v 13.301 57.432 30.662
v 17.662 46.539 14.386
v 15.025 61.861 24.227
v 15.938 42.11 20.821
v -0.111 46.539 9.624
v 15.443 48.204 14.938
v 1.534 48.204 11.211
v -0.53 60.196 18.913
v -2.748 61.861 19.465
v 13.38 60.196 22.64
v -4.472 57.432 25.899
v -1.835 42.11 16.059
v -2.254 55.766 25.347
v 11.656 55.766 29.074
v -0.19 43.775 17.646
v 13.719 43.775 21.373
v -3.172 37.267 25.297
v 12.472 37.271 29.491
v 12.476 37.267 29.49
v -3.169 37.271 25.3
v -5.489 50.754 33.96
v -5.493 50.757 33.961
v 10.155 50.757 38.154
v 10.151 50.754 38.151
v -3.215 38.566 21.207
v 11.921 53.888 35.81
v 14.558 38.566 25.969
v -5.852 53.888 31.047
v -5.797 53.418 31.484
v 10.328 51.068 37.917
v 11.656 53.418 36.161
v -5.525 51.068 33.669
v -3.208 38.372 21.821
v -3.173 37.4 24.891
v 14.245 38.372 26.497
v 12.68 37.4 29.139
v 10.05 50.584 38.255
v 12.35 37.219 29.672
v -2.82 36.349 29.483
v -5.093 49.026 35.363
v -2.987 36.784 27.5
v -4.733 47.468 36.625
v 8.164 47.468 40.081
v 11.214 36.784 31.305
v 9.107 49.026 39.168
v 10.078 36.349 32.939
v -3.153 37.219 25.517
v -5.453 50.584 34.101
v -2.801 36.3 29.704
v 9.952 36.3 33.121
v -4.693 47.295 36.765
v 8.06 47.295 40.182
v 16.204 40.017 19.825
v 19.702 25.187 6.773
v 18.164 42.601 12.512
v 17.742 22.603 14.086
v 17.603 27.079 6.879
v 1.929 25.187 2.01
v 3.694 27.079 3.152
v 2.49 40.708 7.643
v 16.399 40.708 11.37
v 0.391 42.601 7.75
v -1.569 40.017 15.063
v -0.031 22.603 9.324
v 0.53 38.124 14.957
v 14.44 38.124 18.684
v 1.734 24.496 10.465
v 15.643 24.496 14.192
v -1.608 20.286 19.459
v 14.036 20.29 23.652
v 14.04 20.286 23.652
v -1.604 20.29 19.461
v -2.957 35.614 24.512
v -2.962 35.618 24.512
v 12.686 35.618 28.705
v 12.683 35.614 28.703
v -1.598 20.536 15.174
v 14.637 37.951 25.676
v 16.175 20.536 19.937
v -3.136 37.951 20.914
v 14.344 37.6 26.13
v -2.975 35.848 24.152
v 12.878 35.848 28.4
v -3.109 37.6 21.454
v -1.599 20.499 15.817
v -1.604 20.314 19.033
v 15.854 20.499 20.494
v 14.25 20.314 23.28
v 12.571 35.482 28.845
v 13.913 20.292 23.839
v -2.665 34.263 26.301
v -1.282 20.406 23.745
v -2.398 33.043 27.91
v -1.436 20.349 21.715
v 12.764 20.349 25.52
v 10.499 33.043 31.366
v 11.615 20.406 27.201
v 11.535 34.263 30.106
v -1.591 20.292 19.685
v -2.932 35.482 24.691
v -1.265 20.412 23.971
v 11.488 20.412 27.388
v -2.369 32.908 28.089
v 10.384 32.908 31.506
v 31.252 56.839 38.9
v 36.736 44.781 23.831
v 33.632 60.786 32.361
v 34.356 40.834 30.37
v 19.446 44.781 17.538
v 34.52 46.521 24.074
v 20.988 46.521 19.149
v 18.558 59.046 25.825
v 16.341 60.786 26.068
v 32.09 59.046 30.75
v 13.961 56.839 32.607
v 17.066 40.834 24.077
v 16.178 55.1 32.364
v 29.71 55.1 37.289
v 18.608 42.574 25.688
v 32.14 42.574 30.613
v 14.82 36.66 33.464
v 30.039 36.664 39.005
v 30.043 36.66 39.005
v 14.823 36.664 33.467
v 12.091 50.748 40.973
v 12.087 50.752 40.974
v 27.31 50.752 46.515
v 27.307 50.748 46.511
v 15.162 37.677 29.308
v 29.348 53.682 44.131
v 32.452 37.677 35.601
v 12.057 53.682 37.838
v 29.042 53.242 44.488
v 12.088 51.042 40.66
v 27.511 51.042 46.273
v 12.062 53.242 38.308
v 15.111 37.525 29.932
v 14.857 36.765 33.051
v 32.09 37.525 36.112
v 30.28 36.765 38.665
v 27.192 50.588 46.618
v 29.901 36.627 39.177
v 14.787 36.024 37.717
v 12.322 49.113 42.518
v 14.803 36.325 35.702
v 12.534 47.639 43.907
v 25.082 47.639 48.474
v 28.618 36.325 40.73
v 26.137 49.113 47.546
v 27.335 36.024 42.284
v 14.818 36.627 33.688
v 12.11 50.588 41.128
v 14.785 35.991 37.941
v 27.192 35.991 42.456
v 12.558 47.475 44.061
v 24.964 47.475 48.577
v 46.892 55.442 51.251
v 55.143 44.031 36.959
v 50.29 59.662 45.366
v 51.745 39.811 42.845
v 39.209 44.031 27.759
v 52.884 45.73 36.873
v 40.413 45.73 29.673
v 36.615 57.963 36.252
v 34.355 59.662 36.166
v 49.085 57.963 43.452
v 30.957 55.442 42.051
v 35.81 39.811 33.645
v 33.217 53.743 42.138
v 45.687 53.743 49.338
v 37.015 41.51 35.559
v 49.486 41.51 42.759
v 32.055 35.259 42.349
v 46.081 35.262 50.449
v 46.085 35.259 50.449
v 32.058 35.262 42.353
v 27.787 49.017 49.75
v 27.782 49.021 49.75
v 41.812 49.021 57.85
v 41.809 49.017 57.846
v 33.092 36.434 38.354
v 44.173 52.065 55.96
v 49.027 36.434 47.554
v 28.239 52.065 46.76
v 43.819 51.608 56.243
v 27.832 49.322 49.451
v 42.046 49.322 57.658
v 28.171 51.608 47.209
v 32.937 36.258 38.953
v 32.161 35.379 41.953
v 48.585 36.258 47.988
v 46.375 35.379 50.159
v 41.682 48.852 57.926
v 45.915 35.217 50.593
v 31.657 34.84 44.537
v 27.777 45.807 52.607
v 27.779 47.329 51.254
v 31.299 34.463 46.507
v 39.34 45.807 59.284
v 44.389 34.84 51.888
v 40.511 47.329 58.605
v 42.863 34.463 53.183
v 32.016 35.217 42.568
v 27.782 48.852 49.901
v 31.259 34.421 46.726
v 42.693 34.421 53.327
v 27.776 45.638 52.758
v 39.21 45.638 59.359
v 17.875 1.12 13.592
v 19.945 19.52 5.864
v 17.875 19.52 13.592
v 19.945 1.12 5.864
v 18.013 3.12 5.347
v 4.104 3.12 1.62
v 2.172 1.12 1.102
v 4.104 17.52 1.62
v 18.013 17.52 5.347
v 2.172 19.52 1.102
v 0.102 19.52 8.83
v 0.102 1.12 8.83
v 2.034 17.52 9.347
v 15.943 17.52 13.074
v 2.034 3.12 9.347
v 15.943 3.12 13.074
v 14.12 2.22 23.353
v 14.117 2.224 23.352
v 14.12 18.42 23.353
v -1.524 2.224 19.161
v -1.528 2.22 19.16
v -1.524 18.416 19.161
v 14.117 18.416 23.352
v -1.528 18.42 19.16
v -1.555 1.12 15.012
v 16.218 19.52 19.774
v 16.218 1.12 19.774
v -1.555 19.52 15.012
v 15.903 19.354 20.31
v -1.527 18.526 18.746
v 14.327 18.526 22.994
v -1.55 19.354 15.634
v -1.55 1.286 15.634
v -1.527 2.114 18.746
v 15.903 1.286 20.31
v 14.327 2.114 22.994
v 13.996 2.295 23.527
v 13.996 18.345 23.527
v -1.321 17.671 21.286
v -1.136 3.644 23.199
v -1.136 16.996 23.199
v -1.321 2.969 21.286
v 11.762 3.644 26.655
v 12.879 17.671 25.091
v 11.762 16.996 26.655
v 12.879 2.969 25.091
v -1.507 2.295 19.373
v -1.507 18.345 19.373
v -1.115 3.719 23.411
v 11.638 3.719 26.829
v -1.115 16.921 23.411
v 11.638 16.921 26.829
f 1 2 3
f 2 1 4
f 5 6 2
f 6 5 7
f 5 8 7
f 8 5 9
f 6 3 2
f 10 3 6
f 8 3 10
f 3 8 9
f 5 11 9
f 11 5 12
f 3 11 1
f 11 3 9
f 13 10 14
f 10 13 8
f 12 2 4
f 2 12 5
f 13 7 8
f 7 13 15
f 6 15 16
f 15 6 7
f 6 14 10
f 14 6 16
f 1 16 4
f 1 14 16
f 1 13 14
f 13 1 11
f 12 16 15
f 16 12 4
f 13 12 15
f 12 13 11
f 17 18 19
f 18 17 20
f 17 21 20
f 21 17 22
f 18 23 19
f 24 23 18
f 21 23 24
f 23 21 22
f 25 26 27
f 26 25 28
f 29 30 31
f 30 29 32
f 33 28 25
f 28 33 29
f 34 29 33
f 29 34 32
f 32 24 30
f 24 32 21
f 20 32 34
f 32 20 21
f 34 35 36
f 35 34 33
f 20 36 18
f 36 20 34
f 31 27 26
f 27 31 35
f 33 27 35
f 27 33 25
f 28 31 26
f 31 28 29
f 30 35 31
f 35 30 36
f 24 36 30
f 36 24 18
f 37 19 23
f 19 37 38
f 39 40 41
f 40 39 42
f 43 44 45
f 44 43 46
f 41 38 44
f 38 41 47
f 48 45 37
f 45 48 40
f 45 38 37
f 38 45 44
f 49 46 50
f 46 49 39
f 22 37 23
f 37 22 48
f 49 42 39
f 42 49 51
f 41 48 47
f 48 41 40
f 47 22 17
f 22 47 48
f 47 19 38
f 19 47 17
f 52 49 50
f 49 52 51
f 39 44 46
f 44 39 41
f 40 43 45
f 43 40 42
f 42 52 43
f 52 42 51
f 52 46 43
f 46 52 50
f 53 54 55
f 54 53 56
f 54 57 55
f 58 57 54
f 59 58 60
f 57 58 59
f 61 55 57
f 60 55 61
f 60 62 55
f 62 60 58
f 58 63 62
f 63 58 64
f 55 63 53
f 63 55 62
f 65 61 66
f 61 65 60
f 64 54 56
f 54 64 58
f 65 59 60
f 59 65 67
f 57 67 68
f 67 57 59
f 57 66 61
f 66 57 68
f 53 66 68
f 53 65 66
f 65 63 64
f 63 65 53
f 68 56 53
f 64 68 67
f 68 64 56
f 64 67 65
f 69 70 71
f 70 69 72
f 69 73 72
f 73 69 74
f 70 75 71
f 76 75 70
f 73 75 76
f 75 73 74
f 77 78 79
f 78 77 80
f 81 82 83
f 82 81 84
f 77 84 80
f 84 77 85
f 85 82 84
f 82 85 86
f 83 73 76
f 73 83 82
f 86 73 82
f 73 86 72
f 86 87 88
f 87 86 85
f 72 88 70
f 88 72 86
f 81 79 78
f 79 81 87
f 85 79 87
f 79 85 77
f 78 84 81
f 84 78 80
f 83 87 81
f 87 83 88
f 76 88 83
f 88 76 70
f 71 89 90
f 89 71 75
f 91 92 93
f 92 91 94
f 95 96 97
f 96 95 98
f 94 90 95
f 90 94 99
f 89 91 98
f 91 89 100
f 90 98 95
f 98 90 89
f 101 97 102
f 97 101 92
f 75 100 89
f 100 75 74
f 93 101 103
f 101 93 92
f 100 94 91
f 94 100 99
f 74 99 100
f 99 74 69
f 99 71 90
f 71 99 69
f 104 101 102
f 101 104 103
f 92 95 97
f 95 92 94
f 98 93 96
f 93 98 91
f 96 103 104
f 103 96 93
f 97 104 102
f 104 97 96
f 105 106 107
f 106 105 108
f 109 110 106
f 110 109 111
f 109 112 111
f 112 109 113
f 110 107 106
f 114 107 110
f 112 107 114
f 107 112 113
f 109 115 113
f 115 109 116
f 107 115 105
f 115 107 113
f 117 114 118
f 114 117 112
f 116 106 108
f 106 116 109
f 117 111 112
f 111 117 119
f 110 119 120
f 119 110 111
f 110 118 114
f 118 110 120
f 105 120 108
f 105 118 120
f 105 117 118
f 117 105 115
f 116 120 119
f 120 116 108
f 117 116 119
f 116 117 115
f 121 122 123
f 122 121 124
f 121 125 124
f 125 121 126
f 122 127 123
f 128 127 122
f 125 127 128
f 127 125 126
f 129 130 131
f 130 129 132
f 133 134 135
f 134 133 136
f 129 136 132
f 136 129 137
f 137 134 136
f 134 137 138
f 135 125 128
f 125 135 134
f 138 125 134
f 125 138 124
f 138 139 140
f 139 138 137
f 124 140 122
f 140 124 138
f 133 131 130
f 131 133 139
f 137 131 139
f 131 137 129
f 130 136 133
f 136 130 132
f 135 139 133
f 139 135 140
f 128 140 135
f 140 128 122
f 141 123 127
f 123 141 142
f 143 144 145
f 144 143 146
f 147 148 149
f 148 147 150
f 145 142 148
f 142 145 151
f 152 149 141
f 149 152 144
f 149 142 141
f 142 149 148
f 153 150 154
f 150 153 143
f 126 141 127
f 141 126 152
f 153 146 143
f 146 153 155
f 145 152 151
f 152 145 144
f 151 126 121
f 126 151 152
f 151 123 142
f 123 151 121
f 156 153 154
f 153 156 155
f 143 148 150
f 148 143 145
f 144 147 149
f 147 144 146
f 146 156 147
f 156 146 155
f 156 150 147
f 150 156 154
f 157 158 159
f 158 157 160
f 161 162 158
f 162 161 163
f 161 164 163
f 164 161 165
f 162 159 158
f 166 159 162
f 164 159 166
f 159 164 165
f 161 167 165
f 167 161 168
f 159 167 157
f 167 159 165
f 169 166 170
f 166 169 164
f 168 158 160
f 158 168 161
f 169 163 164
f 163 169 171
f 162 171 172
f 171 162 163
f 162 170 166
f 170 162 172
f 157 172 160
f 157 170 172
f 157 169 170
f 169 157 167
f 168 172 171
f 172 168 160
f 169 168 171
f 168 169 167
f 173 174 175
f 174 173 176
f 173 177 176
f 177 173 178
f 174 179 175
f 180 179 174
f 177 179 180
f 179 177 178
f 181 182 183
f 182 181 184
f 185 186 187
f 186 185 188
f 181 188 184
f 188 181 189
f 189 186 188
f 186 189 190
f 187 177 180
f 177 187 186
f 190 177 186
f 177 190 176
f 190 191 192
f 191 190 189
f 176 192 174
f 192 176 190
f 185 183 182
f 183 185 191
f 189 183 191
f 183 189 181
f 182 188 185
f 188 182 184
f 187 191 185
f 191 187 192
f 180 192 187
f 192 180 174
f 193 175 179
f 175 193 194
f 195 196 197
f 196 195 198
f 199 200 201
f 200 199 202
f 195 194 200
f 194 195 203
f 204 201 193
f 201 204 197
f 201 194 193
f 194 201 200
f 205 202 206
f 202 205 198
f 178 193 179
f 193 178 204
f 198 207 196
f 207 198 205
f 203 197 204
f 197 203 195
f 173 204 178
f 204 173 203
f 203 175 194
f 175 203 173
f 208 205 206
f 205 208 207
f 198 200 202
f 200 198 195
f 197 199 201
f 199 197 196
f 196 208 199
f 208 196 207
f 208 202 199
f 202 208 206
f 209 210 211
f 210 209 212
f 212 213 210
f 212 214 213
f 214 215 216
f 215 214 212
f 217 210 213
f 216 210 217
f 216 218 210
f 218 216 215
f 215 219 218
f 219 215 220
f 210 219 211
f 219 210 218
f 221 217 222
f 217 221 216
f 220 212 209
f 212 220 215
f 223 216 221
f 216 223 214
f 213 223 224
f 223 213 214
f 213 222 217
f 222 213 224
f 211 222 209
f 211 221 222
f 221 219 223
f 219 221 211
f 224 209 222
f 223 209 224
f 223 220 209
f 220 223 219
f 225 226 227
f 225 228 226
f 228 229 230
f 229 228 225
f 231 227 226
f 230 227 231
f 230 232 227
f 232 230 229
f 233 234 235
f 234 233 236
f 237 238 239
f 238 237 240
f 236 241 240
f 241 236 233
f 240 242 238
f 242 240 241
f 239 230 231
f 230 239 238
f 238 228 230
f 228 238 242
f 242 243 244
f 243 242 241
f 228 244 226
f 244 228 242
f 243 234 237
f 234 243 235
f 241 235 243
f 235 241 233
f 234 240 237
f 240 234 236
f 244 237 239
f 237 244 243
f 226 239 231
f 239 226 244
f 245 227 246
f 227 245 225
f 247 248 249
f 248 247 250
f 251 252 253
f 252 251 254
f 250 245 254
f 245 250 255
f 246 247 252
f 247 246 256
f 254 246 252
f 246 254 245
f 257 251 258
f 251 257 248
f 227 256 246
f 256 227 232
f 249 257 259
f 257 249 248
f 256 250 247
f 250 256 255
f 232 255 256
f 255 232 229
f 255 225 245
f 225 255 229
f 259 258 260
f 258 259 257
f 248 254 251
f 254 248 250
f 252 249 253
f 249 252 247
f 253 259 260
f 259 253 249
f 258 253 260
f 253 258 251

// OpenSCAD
union () {
  union () {
    translate ([-20.000, -40.000, 3.000]) {
      translate ([26.400, 50.320, 17.870]) {
        rotate (a = -15.000, v = [0.000, 1.000, 0.000]) {
          translate ([0.000, 0.000, 55.000]) {
            rotate (a = 18.840, v = [1.000, 0.000, 0.000]) {
              translate ([0.000, 0.000, -55.000]) {
                translate ([0.000, 0.000, 70.000]) {
                  rotate (a = 14.780, v = [1.000, 0.000, 0.000]) {
                    translate ([0.000, 0.000, -70.000]) {
                      translate ([0.000, 0.000, -10.000]) {
                        translate ([0.000, 0.000, -4.000]) {
                          union () {
                            translate ([0.000, 0.000, -4.000]) {
                              union () {
                                translate ([0.000, 8.200, 2.000]) {
                                  cube (size = [ 18.400, 2.000, 4.000], center = true);
                                }
                                rotate (a = 90.000, v = [0.000, 0.000, 1.000]) {
                                  translate ([0.000, 8.200, 2.000]) {
                                    cube (size = [ 18.400, 2.000, 4.000], center = true);
                                  }
                                }
                                rotate (a = 180.000, v = [0.000, 0.000, 1.000]) {
                                  translate ([0.000, 8.200, 2.000]) {
                                    cube (size = [ 18.400, 2.000, 4.000], center = true);
                                  }
                                }
                                rotate (a = 270.000, v = [0.000, 0.000, 1.000]) {
                                  translate ([0.000, 8.200, 2.000]) {
                                    cube (size = [ 18.400, 2.000, 4.000], center = true);
                                  }
                                }
                              }
                            }
                            translate ([0.000, 0.000, 4.000]) {
                              translate ([0.000, 0.000, -4.000]) {
                                union () {
                                  translate ([0.000, 8.200, 2.000]) {
                                    cube (size = [ 18.400, 2.000, 4.000], center = true);
                                  }
                                  rotate (a = 90.000, v = [0.000, 0.000, 1.000]) {
                                    translate ([0.000, 8.200, 2.000]) {
                                      cube (size = [ 18.400, 2.000, 4.000], center = true);
                                    }
                                  }
                                  rotate (a = 180.000, v = [0.000, 0.000, 1.000]) {
                                    translate ([0.000, 8.200, 2.000]) {
                                      cube (size = [ 18.400, 2.000, 4.000], center = true);
                                    }
                                  }
                                  rotate (a = 270.000, v = [0.000, 0.000, 1.000]) {
                                    translate ([0.000, 8.200, 2.000]) {
                                      cube (size = [ 18.400, 2.000, 4.000], center = true);
                                    }
                                  }
                                }
                              }
                            }
                          }
                        }
                      }
                    }
                  }
                }
              }
            }
          }
        }
      }
    }
  }
  color ("red", 1.000000) {
    translate ([-20.000, -40.000, 3.000]) {
      translate ([26.400, 50.320, 17.870]) {
        rotate (a = -15.000, v = [0.000, 1.000, 0.000]) {
          translate ([0.000, 0.000, 55.000]) {
            rotate (a = 18.840, v = [1.000, 0.000, 0.000]) {
              translate ([0.000, 0.000, -55.000]) {
                translate ([0.000, 0.000, 70.000]) {
                  rotate (a = 14.780, v = [1.000, 0.000, 0.000]) {
                    translate ([0.000, 0.000, -70.000]) {
                      translate ([0.000, 0.000, -10.000]) {
                        translate ([0.000, 0.000, 14.400]) {
                          translate ([0.000, 0.000, -8.000]) {
                            union () {
                              translate ([0.000, 0.000, 4.000]) {
                                translate ([0.000, 0.000, -2.000]) {
                                  linear_extrude (height = 4.000, center = true, convexity = 10.000, twist = 0.000, slices = 20, scale = 0.880) {
                                    square (size = [18.400, 18.400], center = true);
                                  }
                                }
                              }
                              translate ([0.000, 0.000, 8.000]) {
                                translate ([0.000, 0.000, -2.000]) {
                                  linear_extrude (height = 4.000, center = true, convexity = 10.000, twist = 0.000, slices = 20, scale = 0.815) {
                                    square (size = [16.200, 16.200], center = true);
                                  }
                                }
                              }
                            }
                          }
                        }
                      }
                    }
                  }
                }
              }
            }
          }
        }
      }
    }
  }
  union () {
    translate ([-20.000, -40.000, 3.000]) {
      translate ([26.400, 50.320, 17.870]) {
        rotate (a = -15.000, v = [0.000, 1.000, 0.000]) {
          translate ([0.000, 0.000, 55.000]) {
            rotate (a = 18.840, v = [1.000, 0.000, 0.000]) {
              translate ([0.000, 0.000, -55.000]) {
                translate ([0.000, 0.000, -10.000]) {
                  translate ([0.000, 0.000, -4.000]) {
                    union () {
                      translate ([0.000, 0.000, -4.000]) {
                        union () {
                          translate ([0.000, 8.200, 2.000]) {
                            cube (size = [ 18.400, 2.000, 4.000], center = true);
                          }
                          rotate (a = 90.000, v = [0.000, 0.000, 1.000]) {
                            translate ([0.000, 8.200, 2.000]) {
                              cube (size = [ 18.400, 2.000, 4.000], center = true);
                            }
                          }
                          rotate (a = 180.000, v = [0.000, 0.000, 1.000]) {
                            translate ([0.000, 8.200, 2.000]) {
                              cube (size = [ 18.400, 2.000, 4.000], center = true);
                            }
                          }
                          rotate (a = 270.000, v = [0.000, 0.000, 1.000]) {
                            translate ([0.000, 8.200, 2.000]) {
                              cube (size = [ 18.400, 2.000, 4.000], center = true);
                            }
                          }
                        }
                      }
                      translate ([0.000, 0.000, 4.000]) {
                        translate ([0.000, 0.000, -4.000]) {
                          union () {
                            translate ([0.000, 8.200, 2.000]) {
                              cube (size = [ 18.400, 2.000, 4.000], center = true);
                            }
                            rotate (a = 90.000, v = [0.000, 0.000, 1.000]) {
                              translate ([0.000, 8.200, 2.000]) {
                                cube (size = [ 18.400, 2.000, 4.000], center = true);
                              }
                            }
                            rotate (a = 180.000, v = [0.000, 0.000, 1.000]) {
                              translate ([0.000, 8.200, 2.000]) {
                                cube (size = [ 18.400, 2.000, 4.000], center = true);
                              }
                            }
                            rotate (a = 270.000, v = [0.000, 0.000, 1.000]) {
                              translate ([0.000, 8.200, 2.000]) {
                                cube (size = [ 18.400, 2.000, 4.000], center = true);
                              }
                            }
                          }
                        }
                      }
                    }
                  }
                }
              }
            }
          }
        }
      }
    }
  }
  color ("red", 1.000000) {
    translate ([-20.000, -40.000, 3.000]) {
      translate ([26.400, 50.320, 17.870]) {
        rotate (a = -15.000, v = [0.000, 1.000, 0.000]) {
          translate ([0.000, 0.000, 55.000]) {
            rotate (a = 18.840, v = [1.000, 0.000, 0.000]) {
              translate ([0.000, 0.000, -55.000]) {
                translate ([0.000, 0.000, -10.000]) {
                  translate ([0.000, 0.000, 14.400]) {
                    translate ([0.000, 0.000, -8.000]) {
                      union () {
                        translate ([0.000, 0.000, 4.000]) {
                          translate ([0.000, 0.000, -2.000]) {
                            linear_extrude (height = 4.000, center = true, convexity = 10.000, twist = 0.000, slices = 20, scale = 0.880) {
                              square (size = [18.400, 18.400], center = true);
                            }
                          }
                        }
                        translate ([0.000, 0.000, 8.000]) {
                          translate ([0.000, 0.000, -2.000]) {
                            linear_extrude (height = 4.000, center = true, convexity = 10.000, twist = 0.000, slices = 20, scale = 0.815) {
                              square (size = [16.200, 16.200], center = true);
                            }
                          }
                        }
                      }
                    }
                  }
                }
              }
            }
          }
        }
      }
    }
  }
  union () {
    translate ([-20.000, -40.000, 3.000]) {
      translate ([26.400, 50.320, 17.870]) {
        rotate (a = -15.000, v = [0.000, 1.000, 0.000]) {
          translate ([19.938, -0.950, 5.249]) {
            rotate (a = -5.000, v = [0.000, 1.000, 0.000]) {
              translate ([0.000, 0.000, 70.000]) {
                rotate (a = 14.780, v = [1.000, 0.000, 0.000]) {
                  translate ([0.000, 0.000, -70.000]) {
                    translate ([0.000, 0.000, 70.000]) {
                      rotate (a = 14.780, v = [1.000, 0.000, 0.000]) {
                        translate ([0.000, 0.000, -70.000]) {
                          translate ([0.000, 0.000, -10.000]) {
                            translate ([0.000, 0.000, -4.000]) {
                              union () {
                                translate ([0.000, 0.000, -4.000]) {
                                  union () {
                                    translate ([0.000, 8.200, 2.000]) {
                                      cube (size = [ 18.400, 2.000, 4.000], center = true);
                                    }
                                    rotate (a = 90.000, v = [0.000, 0.000, 1.000]) {
                                      translate ([0.000, 8.200, 2.000]) {
                                        cube (size = [ 18.400, 2.000, 4.000], center = true);
                                      }
                                    }
                                    rotate (a = 180.000, v = [0.000, 0.000, 1.000]) {
                                      translate ([0.000, 8.200, 2.000]) {
                                        cube (size = [ 18.400, 2.000, 4.000], center = true);
                                      }
                                    }
                                    rotate (a = 270.000, v = [0.000, 0.000, 1.000]) {
                                      translate ([0.000, 8.200, 2.000]) {
                                        cube (size = [ 18.400, 2.000, 4.000], center = true);
                                      }
                                    }
                                  }
                                }
                                translate ([0.000, 0.000, 4.000]) {
                                  translate ([0.000, 0.000, -4.000]) {
                                    union () {
                                      translate ([0.000, 8.200, 2.000]) {
                                        cube (size = [ 18.400, 2.000, 4.000], center = true);
                                      }
                                      rotate (a = 90.000, v = [0.000, 0.000, 1.000]) {
                                        translate ([0.000, 8.200, 2.000]) {
                                          cube (size = [ 18.400, 2.000, 4.000], center = true);
                                        }
                                      }
                                      rotate (a = 180.000, v = [0.000, 0.000, 1.000]) {
                                        translate ([0.000, 8.200, 2.000]) {
                                          cube (size = [ 18.400, 2.000, 4.000], center = true);
                                        }
                                      }
                                      rotate (a = 270.000, v = [0.000, 0.000, 1.000]) {
                                        translate ([0.000, 8.200, 2.000]) {
                                          cube (size = [ 18.400, 2.000, 4.000], center = true);
                                        }
                                      }
                                    }
                                  }
                                }
                              }
                            }
                          }
                        }
                      }
                    }
                  }
                }
              }
            }
          }
        }
      }
    }
  }
  color ("red", 1.000000) {
    translate ([-20.000, -40.000, 3.000]) {
      translate ([26.400, 50.320, 17.870]) {
        rotate (a = -15.000, v = [0.000, 1.000, 0.000]) {
          translate ([19.938, -0.950, 5.249]) {
            rotate (a = -5.000, v = [0.000, 1.000, 0.000]) {
              translate ([0.000, 0.000, 70.000]) {
                rotate (a = 14.780, v = [1.000, 0.000, 0.000]) {
                  translate ([0.000, 0.000, -70.000]) {
                    translate ([0.000, 0.000, 70.000]) {
                      rotate (a = 14.780, v = [1.000, 0.000, 0.000]) {
                        translate ([0.000, 0.000, -70.000]) {
                          translate ([0.000, 0.000, -10.000]) {
                            translate ([0.000, 0.000, 14.400]) {
                              translate ([0.000, 0.000, -8.000]) {
                                union () {
                                  translate ([0.000, 0.000, 4.000]) {
                                    translate ([0.000, 0.000, -2.000]) {
                                      linear_extrude (height = 4.000, center = true, convexity = 10.000, twist = 0.000, slices = 20, scale = 0.880) {
                                        square (size = [18.400, 18.400], center = true);
                                      }
                                    }
                                  }
                                  translate ([0.000, 0.000, 8.000]) {
                                    translate ([0.000, 0.000, -2.000]) {
                                      linear_extrude (height = 4.000, center = true, convexity = 10.000, twist = 0.000, slices = 20, scale = 0.815) {
                                        square (size = [16.200, 16.200], center = true);
                                      }
                                    }
                                  }
                                }
                              }
                            }
                          }
                        }
                      }
                    }
                  }
                }
              }
            }
          }
        }
      }
    }
  }
  union () {
    translate ([-20.000, -40.000, 3.000]) {
      translate ([26.400, 50.320, 17.870]) {
        rotate (a = -15.000, v = [0.000, 1.000, 0.000]) {
          translate ([19.938, -0.950, 5.249]) {
            rotate (a = -5.000, v = [0.000, 1.000, 0.000]) {
              translate ([18.650, -1.310, 3.305]) {
                rotate (a = -10.000, v = [0.000, 1.000, 0.000]) {
                  translate ([0.000, 0.000, 65.000]) {
                    rotate (a = 15.920, v = [1.000, 0.000, 0.000]) {
                      translate ([0.000, 0.000, -65.000]) {
                        translate ([0.000, 0.000, 65.000]) {
                          rotate (a = 15.920, v = [1.000, 0.000, 0.000]) {
                            translate ([1.500, 0.000, -65.000]) {
                              translate ([0.000, 0.000, -10.000]) {
                                translate ([0.000, 0.000, -4.000]) {
                                  union () {
                                    translate ([0.000, 0.000, -4.000]) {
                                      union () {
                                        translate ([0.000, 8.200, 2.000]) {
                                          cube (size = [ 18.400, 2.000, 4.000], center = true);
                                        }
                                        rotate (a = 90.000, v = [0.000, 0.000, 1.000]) {
                                          translate ([0.000, 8.200, 2.000]) {
                                            cube (size = [ 18.400, 2.000, 4.000], center = true);
                                          }
                                        }
                                        rotate (a = 180.000, v = [0.000, 0.000, 1.000]) {
                                          translate ([0.000, 8.200, 2.000]) {
                                            cube (size = [ 18.400, 2.000, 4.000], center = true);
                                          }
                                        }
                                        rotate (a = 270.000, v = [0.000, 0.000, 1.000]) {
                                          translate ([0.000, 8.200, 2.000]) {
                                            cube (size = [ 18.400, 2.000, 4.000], center = true);
                                          }
                                        }
                                      }
                                    }
                                    translate ([0.000, 0.000, 4.000]) {
                                      translate ([0.000, 0.000, -4.000]) {
                                        union () {
                                          translate ([0.000, 8.200, 2.000]) {
                                            cube (size = [ 18.400, 2.000, 4.000], center = true);
                                          }
                                          rotate (a = 90.000, v = [0.000, 0.000, 1.000]) {
                                            translate ([0.000, 8.200, 2.000]) {
                                              cube (size = [ 18.400, 2.000, 4.000], center = true);
                                            }
                                          }
                                          rotate (a = 180.000, v = [0.000, 0.000, 1.000]) {
                                            translate ([0.000, 8.200, 2.000]) {
                                              cube (size = [ 18.400, 2.000, 4.000], center = true);
                                            }
                                          }
                                          rotate (a = 270.000, v = [0.000, 0.000, 1.000]) {
                                            translate ([0.000, 8.200, 2.000]) {
                                              cube (size = [ 18.400, 2.000, 4.000], center = true);
                                            }
                                          }
                                        }
                                      }
                                    }
                                  }
                                }
                              }
                            }
                          }
                        }
                      }
                    }
                  }
                }
              }
            }
          }
        }
      }
    }
  }
  color ("red", 1.000000) {
    translate ([-20.000, -40.000, 3.000]) {
      translate ([26.400, 50.320, 17.870]) {
        rotate (a = -15.000, v = [0.000, 1.000, 0.000]) {
          translate ([19.938, -0.950, 5.249]) {
            rotate (a = -5.000, v = [0.000, 1.000, 0.000]) {
              translate ([18.650, -1.310, 3.305]) {
                rotate (a = -10.000, v = [0.000, 1.000, 0.000]) {
                  translate ([0.000, 0.000, 65.000]) {
                    rotate (a = 15.920, v = [1.000, 0.000, 0.000]) {
                      translate ([0.000, 0.000, -65.000]) {
                        translate ([0.000, 0.000, 65.000]) {
                          rotate (a = 15.920, v = [1.000, 0.000, 0.000]) {
                            translate ([1.500, 0.000, -65.000]) {
                              translate ([0.000, 0.000, -10.000]) {
                                translate ([0.000, 0.000, 14.400]) {
                                  translate ([0.000, 0.000, -8.000]) {
                                    union () {
                                      translate ([0.000, 0.000, 4.000]) {
                                        translate ([0.000, 0.000, -2.000]) {
                                          linear_extrude (height = 4.000, center = true, convexity = 10.000, twist = 0.000, slices = 20, scale = 0.880) {
                                            square (size = [18.400, 18.400], center = true);
                                          }
                                        }
                                      }
                                      translate ([0.000, 0.000, 8.000]) {
                                        translate ([0.000, 0.000, -2.000]) {
                                          linear_extrude (height = 4.000, center = true, convexity = 10.000, twist = 0.000, slices = 20, scale = 0.815) {
                                            square (size = [16.200, 16.200], center = true);
                                          }
                                        }
                                      }
                                    }
                                  }
                                }
                              }
                            }
                          }
                        }
                      }
                    }
                  }
                }
              }
            }
          }
        }
      }
    }
  }
  union () {
    translate ([-20.000, -40.000, 3.000]) {
      translate ([26.400, 50.320, 17.870]) {
        rotate (a = -15.000, v = [0.000, 1.000, 0.000]) {
          translate ([0.000, 0.000, -10.000]) {
            translate ([0.000, 0.000, -4.000]) {
              union () {
                translate ([0.000, 0.000, -4.000]) {
                  union () {
                    translate ([0.000, 8.200, 2.000]) {
                      cube (size = [ 18.400, 2.000, 4.000], center = true);
                    }
                    rotate (a = 90.000, v = [0.000, 0.000, 1.000]) {
                      translate ([0.000, 8.200, 2.000]) {
                        cube (size = [ 18.400, 2.000, 4.000], center = true);
                      }
                    }
                    rotate (a = 180.000, v = [0.000, 0.000, 1.000]) {
                      translate ([0.000, 8.200, 2.000]) {
                        cube (size = [ 18.400, 2.000, 4.000], center = true);
                      }
                    }
                    rotate (a = 270.000, v = [0.000, 0.000, 1.000]) {
                      translate ([0.000, 8.200, 2.000]) {
                        cube (size = [ 18.400, 2.000, 4.000], center = true);
                      }
                    }
                  }
                }
                translate ([0.000, 0.000, 4.000]) {
                  translate ([0.000, 0.000, -4.000]) {
                    union () {
                      translate ([0.000, 8.200, 2.000]) {
                        cube (size = [ 18.400, 2.000, 4.000], center = true);
                      }
                      rotate (a = 90.000, v = [0.000, 0.000, 1.000]) {
                        translate ([0.000, 8.200, 2.000]) {
                          cube (size = [ 18.400, 2.000, 4.000], center = true);
                        }
                      }
                      rotate (a = 180.000, v = [0.000, 0.000, 1.000]) {
                        translate ([0.000, 8.200, 2.000]) {
                          cube (size = [ 18.400, 2.000, 4.000], center = true);
                        }
                      }
                      rotate (a = 270.000, v = [0.000, 0.000, 1.000]) {
                        translate ([0.000, 8.200, 2.000]) {
                          cube (size = [ 18.400, 2.000, 4.000], center = true);
                        }
                      }
                    }
                  }
                }
              }
            }
          }
        }
      }
    }
  }
  color ("red", 1.000000) {
    translate ([-20.000, -40.000, 3.000]) {
      translate ([26.400, 50.320, 17.870]) {
        rotate (a = -15.000, v = [0.000, 1.000, 0.000]) {
          translate ([0.000, 0.000, -10.000]) {
            translate ([0.000, 0.000, 14.400]) {
              translate ([0.000, 0.000, -8.000]) {
                union () {
                  translate ([0.000, 0.000, 4.000]) {
                    translate ([0.000, 0.000, -2.000]) {
                      linear_extrude (height = 4.000, center = true, convexity = 10.000, twist = 0.000, slices = 20, scale = 0.880) {
                        square (size = [18.400, 18.400], center = true);
                      }
                    }
                  }
                  translate ([0.000, 0.000, 8.000]) {
                    translate ([0.000, 0.000, -2.000]) {
                      linear_extrude (height = 4.000, center = true, convexity = 10.000, twist = 0.000, slices = 20, scale = 0.815) {
                        square (size = [16.200, 16.200], center = true);
                      }
                    }
                  }
                }
              }
            }
          }
        }
      }
    }
  }
}
